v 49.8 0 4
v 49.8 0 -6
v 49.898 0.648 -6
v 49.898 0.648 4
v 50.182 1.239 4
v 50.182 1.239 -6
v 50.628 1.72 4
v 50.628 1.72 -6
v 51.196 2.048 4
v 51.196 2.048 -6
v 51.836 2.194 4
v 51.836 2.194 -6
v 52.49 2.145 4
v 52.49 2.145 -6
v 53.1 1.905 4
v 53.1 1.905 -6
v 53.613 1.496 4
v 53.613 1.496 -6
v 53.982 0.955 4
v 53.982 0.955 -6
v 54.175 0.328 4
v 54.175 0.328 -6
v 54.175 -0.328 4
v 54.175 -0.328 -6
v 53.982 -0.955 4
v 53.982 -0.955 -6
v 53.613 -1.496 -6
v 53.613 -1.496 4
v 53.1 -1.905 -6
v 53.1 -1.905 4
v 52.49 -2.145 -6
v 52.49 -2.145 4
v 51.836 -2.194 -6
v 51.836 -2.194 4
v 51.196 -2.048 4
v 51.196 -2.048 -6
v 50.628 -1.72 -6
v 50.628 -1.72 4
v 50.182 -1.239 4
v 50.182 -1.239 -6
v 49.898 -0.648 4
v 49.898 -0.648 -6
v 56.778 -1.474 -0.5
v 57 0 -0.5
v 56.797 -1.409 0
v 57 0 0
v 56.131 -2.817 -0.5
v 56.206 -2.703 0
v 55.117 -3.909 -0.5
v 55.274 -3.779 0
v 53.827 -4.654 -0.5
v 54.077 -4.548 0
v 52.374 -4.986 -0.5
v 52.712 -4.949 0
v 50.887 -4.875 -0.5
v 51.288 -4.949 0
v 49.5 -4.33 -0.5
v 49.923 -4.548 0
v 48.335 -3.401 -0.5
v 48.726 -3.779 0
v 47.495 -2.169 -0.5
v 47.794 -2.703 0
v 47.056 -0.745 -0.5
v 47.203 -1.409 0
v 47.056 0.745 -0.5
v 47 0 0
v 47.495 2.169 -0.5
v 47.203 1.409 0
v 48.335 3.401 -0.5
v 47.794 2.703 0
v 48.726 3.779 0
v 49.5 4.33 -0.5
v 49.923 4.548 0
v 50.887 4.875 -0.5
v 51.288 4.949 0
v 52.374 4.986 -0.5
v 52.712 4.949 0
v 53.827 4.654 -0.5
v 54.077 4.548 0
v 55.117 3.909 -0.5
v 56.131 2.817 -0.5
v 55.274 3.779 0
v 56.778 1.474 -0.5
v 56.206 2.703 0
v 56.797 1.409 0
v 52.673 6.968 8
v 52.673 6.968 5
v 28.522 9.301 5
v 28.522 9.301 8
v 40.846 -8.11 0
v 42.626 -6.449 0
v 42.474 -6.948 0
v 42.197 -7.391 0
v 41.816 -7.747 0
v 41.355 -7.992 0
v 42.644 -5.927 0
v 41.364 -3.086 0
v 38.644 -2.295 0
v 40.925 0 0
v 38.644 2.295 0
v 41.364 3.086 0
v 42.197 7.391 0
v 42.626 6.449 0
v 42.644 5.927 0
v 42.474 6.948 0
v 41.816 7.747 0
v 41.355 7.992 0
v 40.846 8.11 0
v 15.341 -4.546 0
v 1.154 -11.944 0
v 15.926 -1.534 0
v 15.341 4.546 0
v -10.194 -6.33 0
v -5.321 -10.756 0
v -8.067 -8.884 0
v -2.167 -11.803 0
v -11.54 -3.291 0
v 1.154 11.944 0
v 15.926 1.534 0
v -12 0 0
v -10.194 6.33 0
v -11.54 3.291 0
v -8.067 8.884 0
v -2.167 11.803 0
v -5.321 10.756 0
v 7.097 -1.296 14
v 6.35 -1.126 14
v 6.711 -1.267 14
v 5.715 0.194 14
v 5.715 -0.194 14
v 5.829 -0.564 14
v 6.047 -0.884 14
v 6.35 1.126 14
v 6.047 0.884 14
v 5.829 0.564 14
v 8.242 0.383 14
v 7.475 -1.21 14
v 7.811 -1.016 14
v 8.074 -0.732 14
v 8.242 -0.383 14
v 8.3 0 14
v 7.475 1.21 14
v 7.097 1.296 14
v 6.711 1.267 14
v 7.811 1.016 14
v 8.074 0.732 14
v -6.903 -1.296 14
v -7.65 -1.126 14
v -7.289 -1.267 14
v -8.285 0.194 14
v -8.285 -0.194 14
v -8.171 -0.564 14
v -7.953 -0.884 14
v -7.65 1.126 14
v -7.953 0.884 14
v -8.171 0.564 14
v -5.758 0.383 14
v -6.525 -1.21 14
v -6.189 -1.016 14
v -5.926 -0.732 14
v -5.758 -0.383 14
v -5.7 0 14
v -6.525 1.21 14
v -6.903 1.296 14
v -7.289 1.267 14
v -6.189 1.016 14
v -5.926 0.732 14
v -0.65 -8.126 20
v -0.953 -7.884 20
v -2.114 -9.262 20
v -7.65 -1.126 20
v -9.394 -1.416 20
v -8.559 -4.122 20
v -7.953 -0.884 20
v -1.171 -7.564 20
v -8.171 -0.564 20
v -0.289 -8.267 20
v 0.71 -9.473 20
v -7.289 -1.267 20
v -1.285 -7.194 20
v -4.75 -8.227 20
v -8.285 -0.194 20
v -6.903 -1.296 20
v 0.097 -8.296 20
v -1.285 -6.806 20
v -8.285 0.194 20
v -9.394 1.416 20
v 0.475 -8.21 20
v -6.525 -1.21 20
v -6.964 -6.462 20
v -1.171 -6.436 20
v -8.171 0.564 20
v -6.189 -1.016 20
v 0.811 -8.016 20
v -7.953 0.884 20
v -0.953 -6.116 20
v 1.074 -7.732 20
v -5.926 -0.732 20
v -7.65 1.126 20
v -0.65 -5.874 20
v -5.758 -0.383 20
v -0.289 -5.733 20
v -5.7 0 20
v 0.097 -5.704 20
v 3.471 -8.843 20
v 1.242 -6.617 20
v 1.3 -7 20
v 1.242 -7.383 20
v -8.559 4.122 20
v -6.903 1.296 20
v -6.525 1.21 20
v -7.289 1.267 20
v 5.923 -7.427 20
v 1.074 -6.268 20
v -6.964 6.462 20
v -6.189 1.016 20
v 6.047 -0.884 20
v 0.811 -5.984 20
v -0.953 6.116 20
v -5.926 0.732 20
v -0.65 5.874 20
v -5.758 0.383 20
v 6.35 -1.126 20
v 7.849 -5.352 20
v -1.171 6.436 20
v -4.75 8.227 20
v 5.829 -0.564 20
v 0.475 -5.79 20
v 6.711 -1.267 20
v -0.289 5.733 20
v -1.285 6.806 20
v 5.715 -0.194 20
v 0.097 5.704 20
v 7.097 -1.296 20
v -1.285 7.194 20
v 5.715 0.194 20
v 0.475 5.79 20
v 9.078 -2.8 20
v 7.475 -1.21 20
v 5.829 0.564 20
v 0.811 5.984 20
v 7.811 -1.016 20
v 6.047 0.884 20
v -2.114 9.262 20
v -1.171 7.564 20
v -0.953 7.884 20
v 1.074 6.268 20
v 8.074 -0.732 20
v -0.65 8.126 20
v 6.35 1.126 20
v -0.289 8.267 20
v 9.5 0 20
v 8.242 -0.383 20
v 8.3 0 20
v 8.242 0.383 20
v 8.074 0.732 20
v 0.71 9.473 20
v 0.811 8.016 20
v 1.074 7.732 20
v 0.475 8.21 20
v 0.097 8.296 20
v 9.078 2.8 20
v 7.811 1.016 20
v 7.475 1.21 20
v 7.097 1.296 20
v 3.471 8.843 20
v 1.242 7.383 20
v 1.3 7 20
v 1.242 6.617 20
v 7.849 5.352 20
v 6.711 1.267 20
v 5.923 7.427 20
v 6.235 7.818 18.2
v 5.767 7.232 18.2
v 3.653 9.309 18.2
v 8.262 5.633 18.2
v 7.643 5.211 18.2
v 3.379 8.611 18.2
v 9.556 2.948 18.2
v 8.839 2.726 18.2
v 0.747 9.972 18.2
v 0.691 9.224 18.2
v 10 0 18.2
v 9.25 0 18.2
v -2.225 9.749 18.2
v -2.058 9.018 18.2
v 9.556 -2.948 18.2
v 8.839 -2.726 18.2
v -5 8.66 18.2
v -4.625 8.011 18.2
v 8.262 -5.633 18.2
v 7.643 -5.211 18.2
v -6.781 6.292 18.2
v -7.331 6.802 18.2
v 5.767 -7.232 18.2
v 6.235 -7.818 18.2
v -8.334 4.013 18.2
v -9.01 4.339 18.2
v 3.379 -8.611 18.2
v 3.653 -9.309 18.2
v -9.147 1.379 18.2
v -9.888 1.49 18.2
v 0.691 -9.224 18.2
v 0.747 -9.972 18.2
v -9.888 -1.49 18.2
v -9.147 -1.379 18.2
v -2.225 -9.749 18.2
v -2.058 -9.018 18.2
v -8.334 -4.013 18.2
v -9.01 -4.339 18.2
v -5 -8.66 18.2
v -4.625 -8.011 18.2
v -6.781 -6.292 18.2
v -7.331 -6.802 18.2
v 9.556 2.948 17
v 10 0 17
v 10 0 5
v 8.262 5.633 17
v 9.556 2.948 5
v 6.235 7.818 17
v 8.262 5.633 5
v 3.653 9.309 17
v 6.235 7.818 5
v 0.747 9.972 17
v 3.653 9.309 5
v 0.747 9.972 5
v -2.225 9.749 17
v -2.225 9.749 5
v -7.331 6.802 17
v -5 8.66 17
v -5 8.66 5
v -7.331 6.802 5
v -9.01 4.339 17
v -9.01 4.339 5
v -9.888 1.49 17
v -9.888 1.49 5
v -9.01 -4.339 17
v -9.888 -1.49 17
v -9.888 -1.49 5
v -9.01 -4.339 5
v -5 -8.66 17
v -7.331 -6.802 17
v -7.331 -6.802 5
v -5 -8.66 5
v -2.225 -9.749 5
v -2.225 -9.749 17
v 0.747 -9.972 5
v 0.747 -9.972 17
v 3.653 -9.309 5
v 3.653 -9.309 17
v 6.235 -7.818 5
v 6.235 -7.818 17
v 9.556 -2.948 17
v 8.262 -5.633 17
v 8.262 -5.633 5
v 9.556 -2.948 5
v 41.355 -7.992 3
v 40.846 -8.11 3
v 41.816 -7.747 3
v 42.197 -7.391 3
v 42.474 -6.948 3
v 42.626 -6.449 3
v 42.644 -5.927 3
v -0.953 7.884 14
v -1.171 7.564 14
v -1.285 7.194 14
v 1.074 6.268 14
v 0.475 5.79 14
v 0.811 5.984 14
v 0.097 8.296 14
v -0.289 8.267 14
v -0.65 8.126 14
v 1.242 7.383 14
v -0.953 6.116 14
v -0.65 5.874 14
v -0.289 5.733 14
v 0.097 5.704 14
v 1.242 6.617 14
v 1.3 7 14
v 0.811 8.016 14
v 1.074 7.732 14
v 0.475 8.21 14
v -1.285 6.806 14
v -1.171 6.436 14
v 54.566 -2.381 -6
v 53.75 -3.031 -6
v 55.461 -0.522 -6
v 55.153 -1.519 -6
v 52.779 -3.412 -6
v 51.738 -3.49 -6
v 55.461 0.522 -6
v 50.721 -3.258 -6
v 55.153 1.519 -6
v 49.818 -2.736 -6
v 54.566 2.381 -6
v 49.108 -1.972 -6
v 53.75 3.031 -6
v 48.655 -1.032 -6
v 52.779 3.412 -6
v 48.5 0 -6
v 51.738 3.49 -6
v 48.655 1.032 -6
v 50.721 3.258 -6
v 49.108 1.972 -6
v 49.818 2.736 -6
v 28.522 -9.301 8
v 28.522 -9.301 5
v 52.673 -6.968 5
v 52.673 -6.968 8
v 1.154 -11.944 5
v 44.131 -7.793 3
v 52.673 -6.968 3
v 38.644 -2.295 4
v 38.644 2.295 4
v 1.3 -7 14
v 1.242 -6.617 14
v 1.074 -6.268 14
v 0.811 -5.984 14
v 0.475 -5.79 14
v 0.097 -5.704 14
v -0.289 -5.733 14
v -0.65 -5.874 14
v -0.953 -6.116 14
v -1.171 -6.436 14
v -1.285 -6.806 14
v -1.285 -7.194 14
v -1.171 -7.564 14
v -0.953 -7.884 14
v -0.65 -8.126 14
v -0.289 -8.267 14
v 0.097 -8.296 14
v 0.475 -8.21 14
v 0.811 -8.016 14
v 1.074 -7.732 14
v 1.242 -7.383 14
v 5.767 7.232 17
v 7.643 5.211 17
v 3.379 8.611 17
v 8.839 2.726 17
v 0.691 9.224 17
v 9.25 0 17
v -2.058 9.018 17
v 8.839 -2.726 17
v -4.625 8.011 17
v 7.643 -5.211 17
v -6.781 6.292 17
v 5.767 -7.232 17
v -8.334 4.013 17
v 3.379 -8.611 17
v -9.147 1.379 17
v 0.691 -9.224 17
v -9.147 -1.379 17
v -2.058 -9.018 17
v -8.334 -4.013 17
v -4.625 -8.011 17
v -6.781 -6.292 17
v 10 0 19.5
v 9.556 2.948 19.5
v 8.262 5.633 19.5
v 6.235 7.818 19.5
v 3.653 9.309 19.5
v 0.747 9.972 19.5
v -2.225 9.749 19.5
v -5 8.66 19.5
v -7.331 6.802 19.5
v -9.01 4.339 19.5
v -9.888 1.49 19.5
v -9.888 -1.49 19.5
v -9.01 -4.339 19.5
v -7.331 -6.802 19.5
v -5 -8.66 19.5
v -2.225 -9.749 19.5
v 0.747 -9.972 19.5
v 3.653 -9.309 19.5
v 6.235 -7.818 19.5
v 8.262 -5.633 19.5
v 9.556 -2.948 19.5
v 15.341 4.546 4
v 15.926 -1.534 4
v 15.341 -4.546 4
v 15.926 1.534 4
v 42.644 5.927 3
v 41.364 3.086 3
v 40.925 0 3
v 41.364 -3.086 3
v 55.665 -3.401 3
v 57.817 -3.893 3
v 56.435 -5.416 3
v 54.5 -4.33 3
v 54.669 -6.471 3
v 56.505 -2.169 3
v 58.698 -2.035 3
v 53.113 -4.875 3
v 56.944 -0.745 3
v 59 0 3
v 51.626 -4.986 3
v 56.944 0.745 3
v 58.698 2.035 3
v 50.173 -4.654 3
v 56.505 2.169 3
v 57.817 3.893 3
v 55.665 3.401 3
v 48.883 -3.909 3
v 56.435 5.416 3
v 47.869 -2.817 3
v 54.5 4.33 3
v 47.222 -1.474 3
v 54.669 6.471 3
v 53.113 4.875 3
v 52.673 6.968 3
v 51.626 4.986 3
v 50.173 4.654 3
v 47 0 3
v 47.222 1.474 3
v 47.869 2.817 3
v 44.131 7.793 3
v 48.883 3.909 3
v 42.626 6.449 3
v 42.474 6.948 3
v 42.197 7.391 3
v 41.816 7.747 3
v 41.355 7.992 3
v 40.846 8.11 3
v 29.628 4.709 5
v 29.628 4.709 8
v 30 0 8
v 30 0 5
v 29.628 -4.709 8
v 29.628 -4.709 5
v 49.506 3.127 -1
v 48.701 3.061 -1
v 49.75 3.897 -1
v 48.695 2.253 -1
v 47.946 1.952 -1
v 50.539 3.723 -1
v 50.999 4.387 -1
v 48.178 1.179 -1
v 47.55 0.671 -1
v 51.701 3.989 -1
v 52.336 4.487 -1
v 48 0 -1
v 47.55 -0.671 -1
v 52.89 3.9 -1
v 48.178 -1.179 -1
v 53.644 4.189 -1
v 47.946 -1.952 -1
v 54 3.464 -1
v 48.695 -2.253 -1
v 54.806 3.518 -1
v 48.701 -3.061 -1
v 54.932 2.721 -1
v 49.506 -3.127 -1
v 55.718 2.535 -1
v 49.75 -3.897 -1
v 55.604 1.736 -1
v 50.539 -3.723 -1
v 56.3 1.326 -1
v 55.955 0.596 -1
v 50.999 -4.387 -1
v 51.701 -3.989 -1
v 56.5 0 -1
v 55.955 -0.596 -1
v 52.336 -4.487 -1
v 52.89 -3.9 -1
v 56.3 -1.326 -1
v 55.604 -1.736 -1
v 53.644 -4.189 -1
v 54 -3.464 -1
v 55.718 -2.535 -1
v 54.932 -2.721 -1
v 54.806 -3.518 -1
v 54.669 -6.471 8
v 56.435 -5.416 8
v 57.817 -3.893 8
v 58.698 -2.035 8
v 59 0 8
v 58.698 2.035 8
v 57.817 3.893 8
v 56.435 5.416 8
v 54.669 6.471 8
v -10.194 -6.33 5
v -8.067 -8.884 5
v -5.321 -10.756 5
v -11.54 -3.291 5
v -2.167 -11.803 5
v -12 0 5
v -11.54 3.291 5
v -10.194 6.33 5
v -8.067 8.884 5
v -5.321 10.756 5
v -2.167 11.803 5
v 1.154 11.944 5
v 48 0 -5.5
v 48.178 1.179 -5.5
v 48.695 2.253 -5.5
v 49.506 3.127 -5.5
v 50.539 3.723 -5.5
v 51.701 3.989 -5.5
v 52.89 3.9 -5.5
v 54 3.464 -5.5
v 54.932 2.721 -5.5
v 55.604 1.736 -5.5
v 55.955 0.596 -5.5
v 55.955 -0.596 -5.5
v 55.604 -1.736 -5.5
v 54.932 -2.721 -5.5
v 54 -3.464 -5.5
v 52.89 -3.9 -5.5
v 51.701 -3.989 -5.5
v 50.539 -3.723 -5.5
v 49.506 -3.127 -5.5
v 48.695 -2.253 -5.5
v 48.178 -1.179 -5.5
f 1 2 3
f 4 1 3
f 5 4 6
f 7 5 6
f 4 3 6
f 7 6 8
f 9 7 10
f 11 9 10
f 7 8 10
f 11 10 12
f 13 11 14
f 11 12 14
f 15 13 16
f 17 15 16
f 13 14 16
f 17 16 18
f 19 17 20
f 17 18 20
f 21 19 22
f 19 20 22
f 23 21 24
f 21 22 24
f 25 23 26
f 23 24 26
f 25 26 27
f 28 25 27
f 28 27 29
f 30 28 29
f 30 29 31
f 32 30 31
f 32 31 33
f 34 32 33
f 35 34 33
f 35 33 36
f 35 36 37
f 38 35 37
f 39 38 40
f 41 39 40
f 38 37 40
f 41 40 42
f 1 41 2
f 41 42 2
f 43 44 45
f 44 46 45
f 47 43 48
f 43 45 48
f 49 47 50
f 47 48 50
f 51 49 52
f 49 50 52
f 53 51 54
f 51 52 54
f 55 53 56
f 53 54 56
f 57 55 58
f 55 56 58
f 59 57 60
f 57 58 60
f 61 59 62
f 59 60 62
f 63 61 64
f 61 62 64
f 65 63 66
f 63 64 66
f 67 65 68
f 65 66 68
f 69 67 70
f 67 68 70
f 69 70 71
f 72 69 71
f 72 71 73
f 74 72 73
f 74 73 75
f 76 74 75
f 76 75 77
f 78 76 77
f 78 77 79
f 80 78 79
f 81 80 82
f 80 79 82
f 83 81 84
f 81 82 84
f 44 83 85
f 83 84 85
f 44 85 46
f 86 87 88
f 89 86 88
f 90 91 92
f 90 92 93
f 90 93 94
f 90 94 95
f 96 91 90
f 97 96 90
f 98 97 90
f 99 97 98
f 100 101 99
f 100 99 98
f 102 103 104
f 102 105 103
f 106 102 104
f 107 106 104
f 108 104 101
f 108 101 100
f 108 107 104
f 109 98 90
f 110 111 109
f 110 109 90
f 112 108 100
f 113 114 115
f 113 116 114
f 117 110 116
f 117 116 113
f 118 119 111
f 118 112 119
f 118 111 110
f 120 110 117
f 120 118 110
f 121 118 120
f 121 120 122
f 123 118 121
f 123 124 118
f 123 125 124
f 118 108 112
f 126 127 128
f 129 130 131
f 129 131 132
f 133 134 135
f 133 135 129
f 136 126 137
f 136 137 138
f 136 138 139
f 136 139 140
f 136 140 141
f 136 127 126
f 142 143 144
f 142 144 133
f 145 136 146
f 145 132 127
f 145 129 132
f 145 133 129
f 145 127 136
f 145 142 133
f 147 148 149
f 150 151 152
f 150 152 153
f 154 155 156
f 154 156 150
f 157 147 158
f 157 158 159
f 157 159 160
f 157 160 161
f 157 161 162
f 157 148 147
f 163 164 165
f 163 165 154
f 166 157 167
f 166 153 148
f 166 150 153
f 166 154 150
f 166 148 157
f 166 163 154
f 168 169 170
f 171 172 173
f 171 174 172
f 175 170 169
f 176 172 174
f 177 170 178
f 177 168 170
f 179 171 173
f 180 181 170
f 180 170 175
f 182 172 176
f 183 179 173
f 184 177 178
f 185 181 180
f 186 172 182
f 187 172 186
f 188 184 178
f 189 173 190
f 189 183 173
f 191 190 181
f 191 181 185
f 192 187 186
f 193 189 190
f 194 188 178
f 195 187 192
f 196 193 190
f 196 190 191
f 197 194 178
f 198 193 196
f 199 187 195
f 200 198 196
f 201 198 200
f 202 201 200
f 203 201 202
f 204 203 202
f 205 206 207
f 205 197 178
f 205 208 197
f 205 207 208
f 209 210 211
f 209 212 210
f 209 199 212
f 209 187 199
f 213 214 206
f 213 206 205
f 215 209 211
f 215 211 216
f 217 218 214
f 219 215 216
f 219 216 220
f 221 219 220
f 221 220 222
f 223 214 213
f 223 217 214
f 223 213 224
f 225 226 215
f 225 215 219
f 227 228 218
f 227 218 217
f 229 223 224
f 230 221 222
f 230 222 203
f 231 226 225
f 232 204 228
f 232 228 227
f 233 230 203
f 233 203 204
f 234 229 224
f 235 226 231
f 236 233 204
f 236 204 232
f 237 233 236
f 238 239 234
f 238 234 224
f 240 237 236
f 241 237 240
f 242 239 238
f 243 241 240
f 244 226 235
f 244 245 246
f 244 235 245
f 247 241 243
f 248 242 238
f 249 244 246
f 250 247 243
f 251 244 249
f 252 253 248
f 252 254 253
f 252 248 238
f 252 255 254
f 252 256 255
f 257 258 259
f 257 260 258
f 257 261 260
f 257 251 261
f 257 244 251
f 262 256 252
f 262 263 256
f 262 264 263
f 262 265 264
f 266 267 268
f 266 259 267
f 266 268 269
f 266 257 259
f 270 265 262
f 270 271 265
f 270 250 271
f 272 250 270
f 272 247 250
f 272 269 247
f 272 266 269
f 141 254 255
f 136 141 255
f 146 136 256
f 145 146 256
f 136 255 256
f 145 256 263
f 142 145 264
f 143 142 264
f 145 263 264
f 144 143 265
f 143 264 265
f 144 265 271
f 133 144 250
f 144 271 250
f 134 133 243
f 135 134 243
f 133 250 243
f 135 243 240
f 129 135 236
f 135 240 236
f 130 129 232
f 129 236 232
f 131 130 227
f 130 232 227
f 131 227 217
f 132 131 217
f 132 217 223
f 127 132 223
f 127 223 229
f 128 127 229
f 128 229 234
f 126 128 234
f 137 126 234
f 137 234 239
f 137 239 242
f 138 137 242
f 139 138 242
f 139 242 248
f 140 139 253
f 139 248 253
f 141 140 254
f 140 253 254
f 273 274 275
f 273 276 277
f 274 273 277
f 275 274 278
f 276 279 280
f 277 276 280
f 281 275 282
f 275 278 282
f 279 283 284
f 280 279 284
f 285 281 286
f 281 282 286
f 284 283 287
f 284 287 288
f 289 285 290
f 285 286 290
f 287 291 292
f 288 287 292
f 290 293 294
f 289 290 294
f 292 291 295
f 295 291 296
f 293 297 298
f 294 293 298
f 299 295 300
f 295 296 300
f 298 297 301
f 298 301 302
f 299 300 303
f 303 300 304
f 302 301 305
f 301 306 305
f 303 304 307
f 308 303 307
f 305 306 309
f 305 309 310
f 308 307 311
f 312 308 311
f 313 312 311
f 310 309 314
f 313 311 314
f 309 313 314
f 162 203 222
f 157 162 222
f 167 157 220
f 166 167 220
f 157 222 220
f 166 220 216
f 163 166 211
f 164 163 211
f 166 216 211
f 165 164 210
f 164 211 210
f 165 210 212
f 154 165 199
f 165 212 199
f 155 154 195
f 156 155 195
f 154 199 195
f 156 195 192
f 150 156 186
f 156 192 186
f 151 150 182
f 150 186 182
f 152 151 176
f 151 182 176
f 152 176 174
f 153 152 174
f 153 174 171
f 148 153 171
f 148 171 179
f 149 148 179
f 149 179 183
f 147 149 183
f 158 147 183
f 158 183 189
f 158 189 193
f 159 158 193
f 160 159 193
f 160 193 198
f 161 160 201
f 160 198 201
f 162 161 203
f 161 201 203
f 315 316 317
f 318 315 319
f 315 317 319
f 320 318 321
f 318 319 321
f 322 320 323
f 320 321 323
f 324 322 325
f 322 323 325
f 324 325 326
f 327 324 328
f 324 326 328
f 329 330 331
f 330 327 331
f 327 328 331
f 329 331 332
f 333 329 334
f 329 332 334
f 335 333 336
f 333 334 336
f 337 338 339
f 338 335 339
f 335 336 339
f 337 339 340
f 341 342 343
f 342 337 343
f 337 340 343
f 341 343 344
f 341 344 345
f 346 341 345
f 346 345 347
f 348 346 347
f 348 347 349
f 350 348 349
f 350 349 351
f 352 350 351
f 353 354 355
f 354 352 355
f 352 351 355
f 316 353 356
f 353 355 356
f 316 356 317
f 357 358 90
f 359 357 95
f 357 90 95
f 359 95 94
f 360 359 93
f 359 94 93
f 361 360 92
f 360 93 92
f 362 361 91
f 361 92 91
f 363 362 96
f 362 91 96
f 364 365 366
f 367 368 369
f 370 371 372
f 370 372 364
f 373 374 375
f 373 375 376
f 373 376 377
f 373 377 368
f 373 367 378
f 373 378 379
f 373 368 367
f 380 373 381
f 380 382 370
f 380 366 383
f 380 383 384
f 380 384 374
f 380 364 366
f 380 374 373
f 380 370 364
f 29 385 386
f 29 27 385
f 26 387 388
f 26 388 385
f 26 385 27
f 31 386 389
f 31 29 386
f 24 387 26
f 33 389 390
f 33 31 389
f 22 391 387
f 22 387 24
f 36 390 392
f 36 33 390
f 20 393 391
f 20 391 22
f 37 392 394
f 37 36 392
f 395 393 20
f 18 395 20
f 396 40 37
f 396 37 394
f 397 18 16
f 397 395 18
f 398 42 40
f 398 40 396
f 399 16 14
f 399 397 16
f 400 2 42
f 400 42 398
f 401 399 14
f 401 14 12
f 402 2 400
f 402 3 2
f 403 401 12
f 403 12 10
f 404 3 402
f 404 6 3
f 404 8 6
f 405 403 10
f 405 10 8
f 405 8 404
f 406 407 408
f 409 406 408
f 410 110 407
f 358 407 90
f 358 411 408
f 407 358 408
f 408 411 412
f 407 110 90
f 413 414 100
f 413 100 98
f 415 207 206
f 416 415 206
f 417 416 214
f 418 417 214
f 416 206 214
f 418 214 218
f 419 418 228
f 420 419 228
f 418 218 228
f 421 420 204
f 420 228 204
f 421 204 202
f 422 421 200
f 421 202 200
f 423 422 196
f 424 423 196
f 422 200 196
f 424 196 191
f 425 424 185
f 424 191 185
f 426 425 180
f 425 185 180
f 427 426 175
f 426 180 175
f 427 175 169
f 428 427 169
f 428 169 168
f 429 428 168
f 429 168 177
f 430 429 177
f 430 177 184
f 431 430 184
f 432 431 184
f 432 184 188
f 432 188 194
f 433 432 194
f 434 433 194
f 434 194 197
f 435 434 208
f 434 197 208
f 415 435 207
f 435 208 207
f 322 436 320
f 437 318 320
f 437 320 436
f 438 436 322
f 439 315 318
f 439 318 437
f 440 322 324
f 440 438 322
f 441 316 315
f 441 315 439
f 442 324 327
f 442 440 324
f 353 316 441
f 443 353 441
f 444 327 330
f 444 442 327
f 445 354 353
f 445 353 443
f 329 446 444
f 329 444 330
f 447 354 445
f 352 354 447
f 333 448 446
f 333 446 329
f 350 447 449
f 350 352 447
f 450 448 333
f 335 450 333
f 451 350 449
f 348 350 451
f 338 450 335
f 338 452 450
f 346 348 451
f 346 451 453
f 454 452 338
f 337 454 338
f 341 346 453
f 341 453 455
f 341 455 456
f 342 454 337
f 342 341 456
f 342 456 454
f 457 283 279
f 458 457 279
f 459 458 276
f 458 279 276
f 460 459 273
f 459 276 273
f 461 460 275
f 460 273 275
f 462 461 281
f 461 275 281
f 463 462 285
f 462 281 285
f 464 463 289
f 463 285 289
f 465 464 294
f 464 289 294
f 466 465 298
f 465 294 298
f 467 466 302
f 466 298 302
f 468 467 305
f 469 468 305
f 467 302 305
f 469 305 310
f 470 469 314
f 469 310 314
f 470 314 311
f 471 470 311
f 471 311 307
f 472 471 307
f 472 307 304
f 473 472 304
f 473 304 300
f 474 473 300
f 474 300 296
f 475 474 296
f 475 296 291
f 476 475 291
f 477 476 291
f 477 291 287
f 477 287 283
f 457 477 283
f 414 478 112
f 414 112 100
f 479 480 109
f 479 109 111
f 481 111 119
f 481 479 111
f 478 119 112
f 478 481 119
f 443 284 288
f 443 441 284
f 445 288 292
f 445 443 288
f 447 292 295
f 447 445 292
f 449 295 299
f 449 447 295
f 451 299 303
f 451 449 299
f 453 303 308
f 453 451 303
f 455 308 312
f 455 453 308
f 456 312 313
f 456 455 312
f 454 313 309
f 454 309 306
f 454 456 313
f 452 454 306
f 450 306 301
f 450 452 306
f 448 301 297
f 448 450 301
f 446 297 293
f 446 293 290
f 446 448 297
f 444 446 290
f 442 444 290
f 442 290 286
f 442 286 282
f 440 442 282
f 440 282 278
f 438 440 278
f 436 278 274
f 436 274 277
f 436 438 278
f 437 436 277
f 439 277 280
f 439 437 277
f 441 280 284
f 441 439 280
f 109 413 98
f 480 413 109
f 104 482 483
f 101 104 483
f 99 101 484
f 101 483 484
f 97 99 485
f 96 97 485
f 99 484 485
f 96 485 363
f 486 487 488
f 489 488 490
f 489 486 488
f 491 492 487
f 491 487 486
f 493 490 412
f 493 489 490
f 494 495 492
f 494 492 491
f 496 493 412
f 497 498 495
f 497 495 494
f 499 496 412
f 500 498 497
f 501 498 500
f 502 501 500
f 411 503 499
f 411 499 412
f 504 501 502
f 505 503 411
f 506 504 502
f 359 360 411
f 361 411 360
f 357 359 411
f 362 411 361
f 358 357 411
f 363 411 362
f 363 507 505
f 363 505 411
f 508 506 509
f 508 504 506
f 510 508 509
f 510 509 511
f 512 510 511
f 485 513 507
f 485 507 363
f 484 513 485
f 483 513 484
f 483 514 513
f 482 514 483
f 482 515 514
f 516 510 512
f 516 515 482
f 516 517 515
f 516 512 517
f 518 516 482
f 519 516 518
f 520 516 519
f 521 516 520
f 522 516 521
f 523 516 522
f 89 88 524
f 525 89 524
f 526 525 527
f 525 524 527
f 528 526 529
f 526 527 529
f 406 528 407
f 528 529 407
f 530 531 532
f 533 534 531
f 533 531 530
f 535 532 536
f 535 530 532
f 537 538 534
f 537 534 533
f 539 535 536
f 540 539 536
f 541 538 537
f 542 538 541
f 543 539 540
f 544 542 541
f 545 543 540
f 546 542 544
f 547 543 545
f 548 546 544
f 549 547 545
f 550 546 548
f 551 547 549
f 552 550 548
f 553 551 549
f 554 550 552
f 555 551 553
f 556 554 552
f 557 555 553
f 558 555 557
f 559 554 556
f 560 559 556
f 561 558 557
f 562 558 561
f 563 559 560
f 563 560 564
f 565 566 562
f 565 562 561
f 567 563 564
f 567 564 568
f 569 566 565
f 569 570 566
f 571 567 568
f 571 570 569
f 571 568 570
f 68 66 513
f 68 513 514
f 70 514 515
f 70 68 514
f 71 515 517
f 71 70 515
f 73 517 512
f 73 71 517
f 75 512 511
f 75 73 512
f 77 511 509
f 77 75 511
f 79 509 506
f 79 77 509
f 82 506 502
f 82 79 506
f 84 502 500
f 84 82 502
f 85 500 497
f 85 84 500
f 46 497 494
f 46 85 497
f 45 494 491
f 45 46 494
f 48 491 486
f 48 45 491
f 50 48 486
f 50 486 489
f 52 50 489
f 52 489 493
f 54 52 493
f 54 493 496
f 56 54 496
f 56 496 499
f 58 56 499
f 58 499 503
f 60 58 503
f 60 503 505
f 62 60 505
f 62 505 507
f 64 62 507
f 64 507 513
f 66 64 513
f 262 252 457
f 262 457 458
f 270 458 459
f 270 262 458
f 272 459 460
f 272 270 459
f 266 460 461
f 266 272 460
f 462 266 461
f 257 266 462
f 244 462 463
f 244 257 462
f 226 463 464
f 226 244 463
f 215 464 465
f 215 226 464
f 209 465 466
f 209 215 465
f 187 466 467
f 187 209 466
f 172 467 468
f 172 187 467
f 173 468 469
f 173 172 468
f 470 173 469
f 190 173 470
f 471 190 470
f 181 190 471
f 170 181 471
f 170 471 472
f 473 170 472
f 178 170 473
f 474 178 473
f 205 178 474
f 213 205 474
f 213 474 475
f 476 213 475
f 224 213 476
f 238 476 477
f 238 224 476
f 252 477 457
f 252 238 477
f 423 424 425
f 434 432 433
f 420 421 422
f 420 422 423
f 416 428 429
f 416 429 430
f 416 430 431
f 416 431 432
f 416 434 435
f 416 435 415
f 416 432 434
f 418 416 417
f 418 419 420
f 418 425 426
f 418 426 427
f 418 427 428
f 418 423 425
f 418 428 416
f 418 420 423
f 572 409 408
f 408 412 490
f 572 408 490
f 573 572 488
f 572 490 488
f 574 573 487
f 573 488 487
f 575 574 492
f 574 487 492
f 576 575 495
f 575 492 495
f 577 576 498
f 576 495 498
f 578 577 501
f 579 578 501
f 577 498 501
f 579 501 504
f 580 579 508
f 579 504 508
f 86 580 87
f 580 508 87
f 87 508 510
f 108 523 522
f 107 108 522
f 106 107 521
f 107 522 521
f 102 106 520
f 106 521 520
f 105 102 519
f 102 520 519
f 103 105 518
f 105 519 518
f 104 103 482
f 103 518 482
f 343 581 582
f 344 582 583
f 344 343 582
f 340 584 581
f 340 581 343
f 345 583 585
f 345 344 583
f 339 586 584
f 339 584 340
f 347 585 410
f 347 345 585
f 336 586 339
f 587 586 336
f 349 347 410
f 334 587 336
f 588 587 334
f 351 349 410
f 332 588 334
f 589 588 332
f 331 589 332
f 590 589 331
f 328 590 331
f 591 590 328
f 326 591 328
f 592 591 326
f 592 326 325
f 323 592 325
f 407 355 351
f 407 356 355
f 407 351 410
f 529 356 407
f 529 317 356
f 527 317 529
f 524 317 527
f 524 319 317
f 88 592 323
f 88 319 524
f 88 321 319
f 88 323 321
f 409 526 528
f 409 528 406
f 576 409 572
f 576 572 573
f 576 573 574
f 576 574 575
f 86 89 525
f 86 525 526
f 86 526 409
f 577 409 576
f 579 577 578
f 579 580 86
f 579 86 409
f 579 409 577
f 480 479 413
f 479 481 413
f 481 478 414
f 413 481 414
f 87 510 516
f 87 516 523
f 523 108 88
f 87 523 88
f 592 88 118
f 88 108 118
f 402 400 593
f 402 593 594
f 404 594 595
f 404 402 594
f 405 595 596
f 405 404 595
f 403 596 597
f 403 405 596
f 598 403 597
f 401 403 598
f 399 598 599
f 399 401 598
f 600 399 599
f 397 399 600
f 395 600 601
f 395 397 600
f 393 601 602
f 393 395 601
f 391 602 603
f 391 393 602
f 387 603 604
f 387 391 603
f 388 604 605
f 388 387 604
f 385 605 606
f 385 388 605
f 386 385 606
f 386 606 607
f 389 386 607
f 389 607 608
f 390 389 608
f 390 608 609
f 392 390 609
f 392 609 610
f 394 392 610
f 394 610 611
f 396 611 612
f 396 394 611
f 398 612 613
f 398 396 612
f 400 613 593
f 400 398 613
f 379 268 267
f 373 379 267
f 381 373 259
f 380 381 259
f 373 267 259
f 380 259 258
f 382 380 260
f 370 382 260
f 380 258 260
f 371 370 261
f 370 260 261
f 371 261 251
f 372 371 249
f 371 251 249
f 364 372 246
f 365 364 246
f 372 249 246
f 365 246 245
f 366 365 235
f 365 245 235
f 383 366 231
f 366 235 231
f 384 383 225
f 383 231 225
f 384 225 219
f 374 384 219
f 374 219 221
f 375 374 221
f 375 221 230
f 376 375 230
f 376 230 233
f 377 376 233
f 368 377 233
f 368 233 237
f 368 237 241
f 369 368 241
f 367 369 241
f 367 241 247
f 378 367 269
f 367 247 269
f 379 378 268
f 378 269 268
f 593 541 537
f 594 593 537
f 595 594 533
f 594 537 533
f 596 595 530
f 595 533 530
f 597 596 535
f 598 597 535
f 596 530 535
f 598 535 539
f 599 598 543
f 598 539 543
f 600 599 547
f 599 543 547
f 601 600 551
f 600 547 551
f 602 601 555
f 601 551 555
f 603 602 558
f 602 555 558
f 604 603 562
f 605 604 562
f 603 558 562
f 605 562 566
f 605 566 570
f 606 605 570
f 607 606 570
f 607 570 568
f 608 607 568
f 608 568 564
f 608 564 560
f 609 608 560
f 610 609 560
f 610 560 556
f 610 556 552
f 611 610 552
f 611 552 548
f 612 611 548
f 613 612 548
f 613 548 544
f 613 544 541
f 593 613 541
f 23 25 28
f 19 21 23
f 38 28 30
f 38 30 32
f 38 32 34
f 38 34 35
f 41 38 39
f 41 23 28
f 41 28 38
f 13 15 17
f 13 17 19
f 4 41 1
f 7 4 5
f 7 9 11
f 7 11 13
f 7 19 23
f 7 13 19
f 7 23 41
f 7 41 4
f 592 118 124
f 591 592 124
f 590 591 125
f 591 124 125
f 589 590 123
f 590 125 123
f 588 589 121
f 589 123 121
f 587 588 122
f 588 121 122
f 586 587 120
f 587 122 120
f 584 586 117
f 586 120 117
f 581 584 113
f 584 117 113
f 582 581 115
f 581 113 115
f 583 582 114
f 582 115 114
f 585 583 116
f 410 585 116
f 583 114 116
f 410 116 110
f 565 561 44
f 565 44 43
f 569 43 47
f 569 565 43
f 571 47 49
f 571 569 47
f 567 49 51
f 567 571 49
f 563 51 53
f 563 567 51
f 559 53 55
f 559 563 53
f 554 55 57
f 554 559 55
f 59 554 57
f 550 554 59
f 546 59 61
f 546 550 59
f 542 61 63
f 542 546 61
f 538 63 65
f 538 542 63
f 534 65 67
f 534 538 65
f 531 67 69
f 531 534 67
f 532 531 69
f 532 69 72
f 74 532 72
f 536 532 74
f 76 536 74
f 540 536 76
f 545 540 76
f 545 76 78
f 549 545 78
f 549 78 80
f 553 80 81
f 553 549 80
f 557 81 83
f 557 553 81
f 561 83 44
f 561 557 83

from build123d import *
from build123d.topology import SkipClean

# Parameters (mm, degrees)
EXTRUDE_1_DEPTH     = 5
SKETCH_2_R          = 10
EXTRUDE_2_DEPTH     = 15
SKETCH_3_R          = 4
EXTRUDE_3_DEPTH     = 6
SKETCH_4_R          = 5
SKETCH_4_R_2        = 4
EXTRUDE_4_DEPTH     = 1
CHAMFER_1_SIZE      = 0.5
SKETCH_6_R          = 1.3
CUT_EXTRUDE_2_DEPTH = 6
SKETCH_11_R         = 2.2
CUT_EXTRUDE_7_DEPTH = 10
CUT_EXTRUDE_START   = -5
CUT_EXTRUDE_8_DEPTH = 5
SKETCH_14_R         = 5
CUT_EXTRUDE_9_DEPTH = 3
EXTRUDE_START       = -1
SKETCH_15_R         = 10
EXTRUDE_5_DEPTH     = 1
FILLET_1_R          = 2
SKETCH_16_W         = 4.663078912
SKETCH_16_H         = 1.2
EXTRUDE_6_DEPTH     = 4
EXTRUDE_START_2     = 1
EXTRUDE_7_DEPTH     = 1
EXTRUDE_8_DEPTH     = 3


with BuildPart() as part:
    # 草图1 → 凸台-拉伸1 (new body)
    with BuildSketch(Plane.XY):
        with BuildLine():
            Line((52.673076923, 6.967565389), (1.153846154, 11.94439781))
            ThreePointArc((1.153846154, 11.94439781), (-12, 0), (1.153846154, -11.94439781))
            Line((1.153846154, -11.94439781), (52.673076923, -6.967565389))
            ThreePointArc((52.673076923, -6.967565389), (59, 0), (52.673076923, 6.967565389))
        make_face()
    extrude(amount=EXTRUDE_1_DEPTH)

    # 草图2 → 凸台-拉伸2 (add)
    with BuildSketch(Plane.XY.offset(5)):
        Circle(SKETCH_2_R)
    extrude(amount=EXTRUDE_2_DEPTH)

    # 草图3 → 凸台-拉伸3 (add)
    with BuildSketch(Plane(origin=(0, 0, 0), x_dir=(-1, 0, 0), z_dir=(0, 0, -1))):
        with Locations((-52, 0)):
            Circle(SKETCH_3_R)
    extrude(amount=EXTRUDE_3_DEPTH)

    # 草图4 → 凸台-拉伸4 (add)
    with BuildSketch(Plane(origin=(0, 0, 0), x_dir=(-1, 0, 0), z_dir=(0, 0, -1))):
        with Locations(Location((-52, 0, 0), (0, 0, 180))):
            Circle(SKETCH_4_R)
        with Locations((-52, 0)):
            Circle(SKETCH_4_R_2, mode=Mode.SUBTRACT)
    extrude(amount=EXTRUDE_4_DEPTH)

    # 倒角1
    chamfer_1_edges = [part.edges().sort_by_distance(p)[0] for p in [
        (-10, 0, 20),
        (56, 0, -6),
        (47, 0, -1),
    ]]
    chamfer(chamfer_1_edges, length=CHAMFER_1_SIZE)

    # 草图6 → 切除-拉伸2 (cut)
    with BuildSketch(Plane.XY.offset(20)):
        with Locations((0, 7)):
            Circle(SKETCH_6_R)
        with Locations((7, 0)):
            Circle(SKETCH_6_R)
        with Locations((0, -7)):
            Circle(SKETCH_6_R)
        with Locations((-7, 0)):
            Circle(SKETCH_6_R)
    extrude(amount=-CUT_EXTRUDE_2_DEPTH, mode=Mode.SUBTRACT)

    # 草图11 → 切除-拉伸7 (cut)
    with BuildSketch(Plane(origin=(0, 0, -6), x_dir=(-1, 0, 0), z_dir=(0, 0, -1))):
        with Locations((-52, 0)):
            Circle(SKETCH_11_R)
    extrude(amount=-CUT_EXTRUDE_7_DEPTH, mode=Mode.SUBTRACT)

    # 草图12 → 切除-拉伸8 (cut)
    with BuildSketch(Plane.XY.offset(5).offset(CUT_EXTRUDE_START)):
        with BuildLine():
            Line((47.604489244, 5.447888141), (7.564052776, 9.315852382))
            ThreePointArc((7.564052776, 9.315852382), (10.834404305, 5.159038995), (12, 0))
            ThreePointArc((12, 0), (10.834404305, -5.159038995), (7.564052776, -9.315852382))
            Line((7.564052776, -9.315852382), (47.604489244, -5.447888141))
            ThreePointArc((47.604489244, -5.447888141), (45, 0), (47.604489244, 5.447888141))
        make_face()
    extrude(amount=CUT_EXTRUDE_8_DEPTH, mode=Mode.SUBTRACT)

    # 草图14 → 切除-拉伸9 (cut)
    # profile 1 of 2: a face of its own
    with BuildSketch(Plane(origin=(0, 0, 0), x_dir=(-1, 0, 0), z_dir=(0, 0, -1))):
        with BuildLine():
            Line((-52.673076923, 6.967565389), (-44.130557544, 7.792785152))
            ThreePointArc((-44.130557544, 7.792785152), (-63.075, 0), (-44.130557544, -7.792785152))
            Line((-44.130557544, -7.792785152), (-52.673076923, -6.967565389))
            ThreePointArc((-52.673076923, -6.967565389), (-59, 0), (-52.673076923, 6.967565389))
        make_face()
    # profile 2 of 2: a face of its own
    with BuildSketch(Plane(origin=(0, 0, 0), x_dir=(-1, 0, 0), z_dir=(0, 0, -1))):
        with BuildLine():
            ThreePointArc((-44.130557544, -7.792785152), (-41.757693126, -4.213166849), (-40.925, 0))
            ThreePointArc((-40.925, 0), (-41.757693126, 4.213166849), (-44.130557544, 7.792785152))
            Line((-44.130557544, 7.792785152), (-52.673076923, 6.967565389))
            ThreePointArc((-52.673076923, 6.967565389), (-59, 0), (-52.673076923, -6.967565389))
            Line((-52.673076923, -6.967565389), (-44.130557544, -7.792785152))
        make_face()
        with Locations((-52, 0)):
            Circle(SKETCH_14_R, mode=Mode.SUBTRACT)
    extrude(amount=-CUT_EXTRUDE_9_DEPTH, mode=Mode.SUBTRACT)

    # 草图15 → 凸台-拉伸5 (add)
    # profile 1 of 2: a face of its own
    with SkipClean():  # the faces are left unmerged after this step: merging them gives an invalid solid
        with BuildSketch(Plane.XY.offset(5).offset(EXTRUDE_START)):
            with BuildLine():
                ThreePointArc((1.153846154, 11.94439781), (-12, 0), (1.153846154, -11.94439781))
                Line((1.153846154, -11.94439781), (52.673076923, -6.967565389))
                ThreePointArc((52.673076923, -6.967565389), (59, 0), (52.673076923, 6.967565389))
                Line((52.673076923, 6.967565389), (1.153846154, 11.94439781))
            make_face()
            Circle(SKETCH_15_R, mode=Mode.SUBTRACT)
            with BuildLine():
                ThreePointArc((7.564052776, -9.315852382), (12, 0), (7.564052776, 9.315852382))
                Line((7.564052776, 9.315852382), (47.604489244, 5.447888141))
                ThreePointArc((47.604489244, 5.447888141), (45, 0), (47.604489244, -5.447888141))
                Line((47.604489244, -5.447888141), (7.564052776, -9.315852382))
            make_face(mode=Mode.SUBTRACT)
        # profile 2 of 2: a face of its own
        with BuildSketch(Plane.XY.offset(5).offset(EXTRUDE_START)):
            with BuildLine():
                Line((47.604489244, 5.447888141), (7.564052776, 9.315852382))
                ThreePointArc((7.564052776, 9.315852382), (12, 0), (7.564052776, -9.315852382))
                Line((7.564052776, -9.315852382), (47.604489244, -5.447888141))
                ThreePointArc((47.604489244, -5.447888141), (45, 0), (47.604489244, 5.447888141))
            make_face()
        extrude(amount=EXTRUDE_5_DEPTH)
    add(part.part.scale(1), mode=Mode.REPLACE)  # the faces are merged on a copy

    # 圆角1
    # the kernel refuses this fillet: 2 mm, written as the material it takes off along each edge
    with BuildSketch(Plane(origin=(44.130557544, -7.792785152, -8.249501326), x_dir=(-0.9953664842005795, -0.09615384615384645, 0), z_dir=(0, 0, 1)), Plane(origin=(44.130557544, 7.792785152, 3), x_dir=(-0.9953664842005796, 0.09615384615384538, 0), z_dir=(0, 0, -1))) as fillet_1_piece_1:
        with BuildLine():
            CenterArc((3.29980053, -2), FILLET_1_R, 90, 90)
            ThreePointArc((1.29980053, -2), (0.703900692, -0.964905108), (0, 0))
            Line((0, 0), (3.29980053, 0))
        make_face()
    extrude(amount=11.249501326, mode=Mode.SUBTRACT)

    # 草图16 → 切除-旋转1 (revolve, cut)
    with BuildSketch(Plane(origin=(0, 0, 0), x_dir=(1, 0, 0), z_dir=(0, 1, 0))):
        with Locations((11.581539456, -17.6)):
            Rectangle(SKETCH_16_W, SKETCH_16_H)
    revolve(axis=Axis((0, 0, 20), (0, 0, -1)), mode=Mode.SUBTRACT)

    # 草图17 → 凸台-拉伸6 (add)
    with BuildSketch(Plane(origin=(0, 0, 4), x_dir=(-1, 0, 0), z_dir=(0, 0, -1))):
        with BuildLine():
            Line((-7.564052776, 9.315852382), (-42.644471967, 5.927033004))
            ThreePointArc((-42.644471967, 5.927033004), (-40.925, 0), (-42.644471967, -5.927033004))
            Line((-42.644471967, -5.927033004), (-7.564052776, -9.315852382))
            ThreePointArc((-7.564052776, -9.315852382), (-12, 0), (-7.564052776, 9.315852382))
        make_face()
        with BuildLine():
            Line((-38.644471967, 2.294818465), (-38.644471967, -2.294818465))
            Line((-38.644471967, -2.294818465), (-15.340593905, -4.546006888))
            ThreePointArc((-15.340593905, -4.546006888), (-16, 0), (-15.340593905, 4.546006888))
            Line((-15.340593905, 4.546006888), (-38.644471967, 2.294818465))
        make_face(mode=Mode.SUBTRACT)
    extrude(amount=EXTRUDE_6_DEPTH)

    # 草图18 → 凸台-拉伸7 (add)
    with BuildSketch(Plane(origin=(0, 0, 4), x_dir=(-1, 0, 0), z_dir=(0, 0, -1)).offset(EXTRUDE_START_2)):
        with BuildLine():
            Line((-42.644471967, 5.927033004), (-47.604489244, 5.447888141))
            ThreePointArc((-47.604489244, 5.447888141), (-45, 0), (-47.604489244, -5.447888141))
            Line((-47.604489244, -5.447888141), (-42.644471967, -5.927033004))
            ThreePointArc((-42.644471967, -5.927033004), (-40.925, 0), (-42.644471967, 5.927033004))
        make_face()
    extrude(amount=-EXTRUDE_7_DEPTH)

    # 草图19 → 凸台-拉伸8 (add)
    with BuildSketch(Plane.XY.offset(5)):
        with BuildLine():
            Line((28.521899702, -9.30060414), (52.673076923, -6.967565389))
            ThreePointArc((52.673076923, -6.967565389), (59, 0), (52.673076923, 6.967565389))
            Line((52.673076923, 6.967565389), (28.521899702, 9.30060414))
            ThreePointArc((28.521899702, 9.30060414), (30, 0), (28.521899702, -9.30060414))
        make_face()
    extrude(amount=EXTRUDE_8_DEPTH)


solid = part.part
